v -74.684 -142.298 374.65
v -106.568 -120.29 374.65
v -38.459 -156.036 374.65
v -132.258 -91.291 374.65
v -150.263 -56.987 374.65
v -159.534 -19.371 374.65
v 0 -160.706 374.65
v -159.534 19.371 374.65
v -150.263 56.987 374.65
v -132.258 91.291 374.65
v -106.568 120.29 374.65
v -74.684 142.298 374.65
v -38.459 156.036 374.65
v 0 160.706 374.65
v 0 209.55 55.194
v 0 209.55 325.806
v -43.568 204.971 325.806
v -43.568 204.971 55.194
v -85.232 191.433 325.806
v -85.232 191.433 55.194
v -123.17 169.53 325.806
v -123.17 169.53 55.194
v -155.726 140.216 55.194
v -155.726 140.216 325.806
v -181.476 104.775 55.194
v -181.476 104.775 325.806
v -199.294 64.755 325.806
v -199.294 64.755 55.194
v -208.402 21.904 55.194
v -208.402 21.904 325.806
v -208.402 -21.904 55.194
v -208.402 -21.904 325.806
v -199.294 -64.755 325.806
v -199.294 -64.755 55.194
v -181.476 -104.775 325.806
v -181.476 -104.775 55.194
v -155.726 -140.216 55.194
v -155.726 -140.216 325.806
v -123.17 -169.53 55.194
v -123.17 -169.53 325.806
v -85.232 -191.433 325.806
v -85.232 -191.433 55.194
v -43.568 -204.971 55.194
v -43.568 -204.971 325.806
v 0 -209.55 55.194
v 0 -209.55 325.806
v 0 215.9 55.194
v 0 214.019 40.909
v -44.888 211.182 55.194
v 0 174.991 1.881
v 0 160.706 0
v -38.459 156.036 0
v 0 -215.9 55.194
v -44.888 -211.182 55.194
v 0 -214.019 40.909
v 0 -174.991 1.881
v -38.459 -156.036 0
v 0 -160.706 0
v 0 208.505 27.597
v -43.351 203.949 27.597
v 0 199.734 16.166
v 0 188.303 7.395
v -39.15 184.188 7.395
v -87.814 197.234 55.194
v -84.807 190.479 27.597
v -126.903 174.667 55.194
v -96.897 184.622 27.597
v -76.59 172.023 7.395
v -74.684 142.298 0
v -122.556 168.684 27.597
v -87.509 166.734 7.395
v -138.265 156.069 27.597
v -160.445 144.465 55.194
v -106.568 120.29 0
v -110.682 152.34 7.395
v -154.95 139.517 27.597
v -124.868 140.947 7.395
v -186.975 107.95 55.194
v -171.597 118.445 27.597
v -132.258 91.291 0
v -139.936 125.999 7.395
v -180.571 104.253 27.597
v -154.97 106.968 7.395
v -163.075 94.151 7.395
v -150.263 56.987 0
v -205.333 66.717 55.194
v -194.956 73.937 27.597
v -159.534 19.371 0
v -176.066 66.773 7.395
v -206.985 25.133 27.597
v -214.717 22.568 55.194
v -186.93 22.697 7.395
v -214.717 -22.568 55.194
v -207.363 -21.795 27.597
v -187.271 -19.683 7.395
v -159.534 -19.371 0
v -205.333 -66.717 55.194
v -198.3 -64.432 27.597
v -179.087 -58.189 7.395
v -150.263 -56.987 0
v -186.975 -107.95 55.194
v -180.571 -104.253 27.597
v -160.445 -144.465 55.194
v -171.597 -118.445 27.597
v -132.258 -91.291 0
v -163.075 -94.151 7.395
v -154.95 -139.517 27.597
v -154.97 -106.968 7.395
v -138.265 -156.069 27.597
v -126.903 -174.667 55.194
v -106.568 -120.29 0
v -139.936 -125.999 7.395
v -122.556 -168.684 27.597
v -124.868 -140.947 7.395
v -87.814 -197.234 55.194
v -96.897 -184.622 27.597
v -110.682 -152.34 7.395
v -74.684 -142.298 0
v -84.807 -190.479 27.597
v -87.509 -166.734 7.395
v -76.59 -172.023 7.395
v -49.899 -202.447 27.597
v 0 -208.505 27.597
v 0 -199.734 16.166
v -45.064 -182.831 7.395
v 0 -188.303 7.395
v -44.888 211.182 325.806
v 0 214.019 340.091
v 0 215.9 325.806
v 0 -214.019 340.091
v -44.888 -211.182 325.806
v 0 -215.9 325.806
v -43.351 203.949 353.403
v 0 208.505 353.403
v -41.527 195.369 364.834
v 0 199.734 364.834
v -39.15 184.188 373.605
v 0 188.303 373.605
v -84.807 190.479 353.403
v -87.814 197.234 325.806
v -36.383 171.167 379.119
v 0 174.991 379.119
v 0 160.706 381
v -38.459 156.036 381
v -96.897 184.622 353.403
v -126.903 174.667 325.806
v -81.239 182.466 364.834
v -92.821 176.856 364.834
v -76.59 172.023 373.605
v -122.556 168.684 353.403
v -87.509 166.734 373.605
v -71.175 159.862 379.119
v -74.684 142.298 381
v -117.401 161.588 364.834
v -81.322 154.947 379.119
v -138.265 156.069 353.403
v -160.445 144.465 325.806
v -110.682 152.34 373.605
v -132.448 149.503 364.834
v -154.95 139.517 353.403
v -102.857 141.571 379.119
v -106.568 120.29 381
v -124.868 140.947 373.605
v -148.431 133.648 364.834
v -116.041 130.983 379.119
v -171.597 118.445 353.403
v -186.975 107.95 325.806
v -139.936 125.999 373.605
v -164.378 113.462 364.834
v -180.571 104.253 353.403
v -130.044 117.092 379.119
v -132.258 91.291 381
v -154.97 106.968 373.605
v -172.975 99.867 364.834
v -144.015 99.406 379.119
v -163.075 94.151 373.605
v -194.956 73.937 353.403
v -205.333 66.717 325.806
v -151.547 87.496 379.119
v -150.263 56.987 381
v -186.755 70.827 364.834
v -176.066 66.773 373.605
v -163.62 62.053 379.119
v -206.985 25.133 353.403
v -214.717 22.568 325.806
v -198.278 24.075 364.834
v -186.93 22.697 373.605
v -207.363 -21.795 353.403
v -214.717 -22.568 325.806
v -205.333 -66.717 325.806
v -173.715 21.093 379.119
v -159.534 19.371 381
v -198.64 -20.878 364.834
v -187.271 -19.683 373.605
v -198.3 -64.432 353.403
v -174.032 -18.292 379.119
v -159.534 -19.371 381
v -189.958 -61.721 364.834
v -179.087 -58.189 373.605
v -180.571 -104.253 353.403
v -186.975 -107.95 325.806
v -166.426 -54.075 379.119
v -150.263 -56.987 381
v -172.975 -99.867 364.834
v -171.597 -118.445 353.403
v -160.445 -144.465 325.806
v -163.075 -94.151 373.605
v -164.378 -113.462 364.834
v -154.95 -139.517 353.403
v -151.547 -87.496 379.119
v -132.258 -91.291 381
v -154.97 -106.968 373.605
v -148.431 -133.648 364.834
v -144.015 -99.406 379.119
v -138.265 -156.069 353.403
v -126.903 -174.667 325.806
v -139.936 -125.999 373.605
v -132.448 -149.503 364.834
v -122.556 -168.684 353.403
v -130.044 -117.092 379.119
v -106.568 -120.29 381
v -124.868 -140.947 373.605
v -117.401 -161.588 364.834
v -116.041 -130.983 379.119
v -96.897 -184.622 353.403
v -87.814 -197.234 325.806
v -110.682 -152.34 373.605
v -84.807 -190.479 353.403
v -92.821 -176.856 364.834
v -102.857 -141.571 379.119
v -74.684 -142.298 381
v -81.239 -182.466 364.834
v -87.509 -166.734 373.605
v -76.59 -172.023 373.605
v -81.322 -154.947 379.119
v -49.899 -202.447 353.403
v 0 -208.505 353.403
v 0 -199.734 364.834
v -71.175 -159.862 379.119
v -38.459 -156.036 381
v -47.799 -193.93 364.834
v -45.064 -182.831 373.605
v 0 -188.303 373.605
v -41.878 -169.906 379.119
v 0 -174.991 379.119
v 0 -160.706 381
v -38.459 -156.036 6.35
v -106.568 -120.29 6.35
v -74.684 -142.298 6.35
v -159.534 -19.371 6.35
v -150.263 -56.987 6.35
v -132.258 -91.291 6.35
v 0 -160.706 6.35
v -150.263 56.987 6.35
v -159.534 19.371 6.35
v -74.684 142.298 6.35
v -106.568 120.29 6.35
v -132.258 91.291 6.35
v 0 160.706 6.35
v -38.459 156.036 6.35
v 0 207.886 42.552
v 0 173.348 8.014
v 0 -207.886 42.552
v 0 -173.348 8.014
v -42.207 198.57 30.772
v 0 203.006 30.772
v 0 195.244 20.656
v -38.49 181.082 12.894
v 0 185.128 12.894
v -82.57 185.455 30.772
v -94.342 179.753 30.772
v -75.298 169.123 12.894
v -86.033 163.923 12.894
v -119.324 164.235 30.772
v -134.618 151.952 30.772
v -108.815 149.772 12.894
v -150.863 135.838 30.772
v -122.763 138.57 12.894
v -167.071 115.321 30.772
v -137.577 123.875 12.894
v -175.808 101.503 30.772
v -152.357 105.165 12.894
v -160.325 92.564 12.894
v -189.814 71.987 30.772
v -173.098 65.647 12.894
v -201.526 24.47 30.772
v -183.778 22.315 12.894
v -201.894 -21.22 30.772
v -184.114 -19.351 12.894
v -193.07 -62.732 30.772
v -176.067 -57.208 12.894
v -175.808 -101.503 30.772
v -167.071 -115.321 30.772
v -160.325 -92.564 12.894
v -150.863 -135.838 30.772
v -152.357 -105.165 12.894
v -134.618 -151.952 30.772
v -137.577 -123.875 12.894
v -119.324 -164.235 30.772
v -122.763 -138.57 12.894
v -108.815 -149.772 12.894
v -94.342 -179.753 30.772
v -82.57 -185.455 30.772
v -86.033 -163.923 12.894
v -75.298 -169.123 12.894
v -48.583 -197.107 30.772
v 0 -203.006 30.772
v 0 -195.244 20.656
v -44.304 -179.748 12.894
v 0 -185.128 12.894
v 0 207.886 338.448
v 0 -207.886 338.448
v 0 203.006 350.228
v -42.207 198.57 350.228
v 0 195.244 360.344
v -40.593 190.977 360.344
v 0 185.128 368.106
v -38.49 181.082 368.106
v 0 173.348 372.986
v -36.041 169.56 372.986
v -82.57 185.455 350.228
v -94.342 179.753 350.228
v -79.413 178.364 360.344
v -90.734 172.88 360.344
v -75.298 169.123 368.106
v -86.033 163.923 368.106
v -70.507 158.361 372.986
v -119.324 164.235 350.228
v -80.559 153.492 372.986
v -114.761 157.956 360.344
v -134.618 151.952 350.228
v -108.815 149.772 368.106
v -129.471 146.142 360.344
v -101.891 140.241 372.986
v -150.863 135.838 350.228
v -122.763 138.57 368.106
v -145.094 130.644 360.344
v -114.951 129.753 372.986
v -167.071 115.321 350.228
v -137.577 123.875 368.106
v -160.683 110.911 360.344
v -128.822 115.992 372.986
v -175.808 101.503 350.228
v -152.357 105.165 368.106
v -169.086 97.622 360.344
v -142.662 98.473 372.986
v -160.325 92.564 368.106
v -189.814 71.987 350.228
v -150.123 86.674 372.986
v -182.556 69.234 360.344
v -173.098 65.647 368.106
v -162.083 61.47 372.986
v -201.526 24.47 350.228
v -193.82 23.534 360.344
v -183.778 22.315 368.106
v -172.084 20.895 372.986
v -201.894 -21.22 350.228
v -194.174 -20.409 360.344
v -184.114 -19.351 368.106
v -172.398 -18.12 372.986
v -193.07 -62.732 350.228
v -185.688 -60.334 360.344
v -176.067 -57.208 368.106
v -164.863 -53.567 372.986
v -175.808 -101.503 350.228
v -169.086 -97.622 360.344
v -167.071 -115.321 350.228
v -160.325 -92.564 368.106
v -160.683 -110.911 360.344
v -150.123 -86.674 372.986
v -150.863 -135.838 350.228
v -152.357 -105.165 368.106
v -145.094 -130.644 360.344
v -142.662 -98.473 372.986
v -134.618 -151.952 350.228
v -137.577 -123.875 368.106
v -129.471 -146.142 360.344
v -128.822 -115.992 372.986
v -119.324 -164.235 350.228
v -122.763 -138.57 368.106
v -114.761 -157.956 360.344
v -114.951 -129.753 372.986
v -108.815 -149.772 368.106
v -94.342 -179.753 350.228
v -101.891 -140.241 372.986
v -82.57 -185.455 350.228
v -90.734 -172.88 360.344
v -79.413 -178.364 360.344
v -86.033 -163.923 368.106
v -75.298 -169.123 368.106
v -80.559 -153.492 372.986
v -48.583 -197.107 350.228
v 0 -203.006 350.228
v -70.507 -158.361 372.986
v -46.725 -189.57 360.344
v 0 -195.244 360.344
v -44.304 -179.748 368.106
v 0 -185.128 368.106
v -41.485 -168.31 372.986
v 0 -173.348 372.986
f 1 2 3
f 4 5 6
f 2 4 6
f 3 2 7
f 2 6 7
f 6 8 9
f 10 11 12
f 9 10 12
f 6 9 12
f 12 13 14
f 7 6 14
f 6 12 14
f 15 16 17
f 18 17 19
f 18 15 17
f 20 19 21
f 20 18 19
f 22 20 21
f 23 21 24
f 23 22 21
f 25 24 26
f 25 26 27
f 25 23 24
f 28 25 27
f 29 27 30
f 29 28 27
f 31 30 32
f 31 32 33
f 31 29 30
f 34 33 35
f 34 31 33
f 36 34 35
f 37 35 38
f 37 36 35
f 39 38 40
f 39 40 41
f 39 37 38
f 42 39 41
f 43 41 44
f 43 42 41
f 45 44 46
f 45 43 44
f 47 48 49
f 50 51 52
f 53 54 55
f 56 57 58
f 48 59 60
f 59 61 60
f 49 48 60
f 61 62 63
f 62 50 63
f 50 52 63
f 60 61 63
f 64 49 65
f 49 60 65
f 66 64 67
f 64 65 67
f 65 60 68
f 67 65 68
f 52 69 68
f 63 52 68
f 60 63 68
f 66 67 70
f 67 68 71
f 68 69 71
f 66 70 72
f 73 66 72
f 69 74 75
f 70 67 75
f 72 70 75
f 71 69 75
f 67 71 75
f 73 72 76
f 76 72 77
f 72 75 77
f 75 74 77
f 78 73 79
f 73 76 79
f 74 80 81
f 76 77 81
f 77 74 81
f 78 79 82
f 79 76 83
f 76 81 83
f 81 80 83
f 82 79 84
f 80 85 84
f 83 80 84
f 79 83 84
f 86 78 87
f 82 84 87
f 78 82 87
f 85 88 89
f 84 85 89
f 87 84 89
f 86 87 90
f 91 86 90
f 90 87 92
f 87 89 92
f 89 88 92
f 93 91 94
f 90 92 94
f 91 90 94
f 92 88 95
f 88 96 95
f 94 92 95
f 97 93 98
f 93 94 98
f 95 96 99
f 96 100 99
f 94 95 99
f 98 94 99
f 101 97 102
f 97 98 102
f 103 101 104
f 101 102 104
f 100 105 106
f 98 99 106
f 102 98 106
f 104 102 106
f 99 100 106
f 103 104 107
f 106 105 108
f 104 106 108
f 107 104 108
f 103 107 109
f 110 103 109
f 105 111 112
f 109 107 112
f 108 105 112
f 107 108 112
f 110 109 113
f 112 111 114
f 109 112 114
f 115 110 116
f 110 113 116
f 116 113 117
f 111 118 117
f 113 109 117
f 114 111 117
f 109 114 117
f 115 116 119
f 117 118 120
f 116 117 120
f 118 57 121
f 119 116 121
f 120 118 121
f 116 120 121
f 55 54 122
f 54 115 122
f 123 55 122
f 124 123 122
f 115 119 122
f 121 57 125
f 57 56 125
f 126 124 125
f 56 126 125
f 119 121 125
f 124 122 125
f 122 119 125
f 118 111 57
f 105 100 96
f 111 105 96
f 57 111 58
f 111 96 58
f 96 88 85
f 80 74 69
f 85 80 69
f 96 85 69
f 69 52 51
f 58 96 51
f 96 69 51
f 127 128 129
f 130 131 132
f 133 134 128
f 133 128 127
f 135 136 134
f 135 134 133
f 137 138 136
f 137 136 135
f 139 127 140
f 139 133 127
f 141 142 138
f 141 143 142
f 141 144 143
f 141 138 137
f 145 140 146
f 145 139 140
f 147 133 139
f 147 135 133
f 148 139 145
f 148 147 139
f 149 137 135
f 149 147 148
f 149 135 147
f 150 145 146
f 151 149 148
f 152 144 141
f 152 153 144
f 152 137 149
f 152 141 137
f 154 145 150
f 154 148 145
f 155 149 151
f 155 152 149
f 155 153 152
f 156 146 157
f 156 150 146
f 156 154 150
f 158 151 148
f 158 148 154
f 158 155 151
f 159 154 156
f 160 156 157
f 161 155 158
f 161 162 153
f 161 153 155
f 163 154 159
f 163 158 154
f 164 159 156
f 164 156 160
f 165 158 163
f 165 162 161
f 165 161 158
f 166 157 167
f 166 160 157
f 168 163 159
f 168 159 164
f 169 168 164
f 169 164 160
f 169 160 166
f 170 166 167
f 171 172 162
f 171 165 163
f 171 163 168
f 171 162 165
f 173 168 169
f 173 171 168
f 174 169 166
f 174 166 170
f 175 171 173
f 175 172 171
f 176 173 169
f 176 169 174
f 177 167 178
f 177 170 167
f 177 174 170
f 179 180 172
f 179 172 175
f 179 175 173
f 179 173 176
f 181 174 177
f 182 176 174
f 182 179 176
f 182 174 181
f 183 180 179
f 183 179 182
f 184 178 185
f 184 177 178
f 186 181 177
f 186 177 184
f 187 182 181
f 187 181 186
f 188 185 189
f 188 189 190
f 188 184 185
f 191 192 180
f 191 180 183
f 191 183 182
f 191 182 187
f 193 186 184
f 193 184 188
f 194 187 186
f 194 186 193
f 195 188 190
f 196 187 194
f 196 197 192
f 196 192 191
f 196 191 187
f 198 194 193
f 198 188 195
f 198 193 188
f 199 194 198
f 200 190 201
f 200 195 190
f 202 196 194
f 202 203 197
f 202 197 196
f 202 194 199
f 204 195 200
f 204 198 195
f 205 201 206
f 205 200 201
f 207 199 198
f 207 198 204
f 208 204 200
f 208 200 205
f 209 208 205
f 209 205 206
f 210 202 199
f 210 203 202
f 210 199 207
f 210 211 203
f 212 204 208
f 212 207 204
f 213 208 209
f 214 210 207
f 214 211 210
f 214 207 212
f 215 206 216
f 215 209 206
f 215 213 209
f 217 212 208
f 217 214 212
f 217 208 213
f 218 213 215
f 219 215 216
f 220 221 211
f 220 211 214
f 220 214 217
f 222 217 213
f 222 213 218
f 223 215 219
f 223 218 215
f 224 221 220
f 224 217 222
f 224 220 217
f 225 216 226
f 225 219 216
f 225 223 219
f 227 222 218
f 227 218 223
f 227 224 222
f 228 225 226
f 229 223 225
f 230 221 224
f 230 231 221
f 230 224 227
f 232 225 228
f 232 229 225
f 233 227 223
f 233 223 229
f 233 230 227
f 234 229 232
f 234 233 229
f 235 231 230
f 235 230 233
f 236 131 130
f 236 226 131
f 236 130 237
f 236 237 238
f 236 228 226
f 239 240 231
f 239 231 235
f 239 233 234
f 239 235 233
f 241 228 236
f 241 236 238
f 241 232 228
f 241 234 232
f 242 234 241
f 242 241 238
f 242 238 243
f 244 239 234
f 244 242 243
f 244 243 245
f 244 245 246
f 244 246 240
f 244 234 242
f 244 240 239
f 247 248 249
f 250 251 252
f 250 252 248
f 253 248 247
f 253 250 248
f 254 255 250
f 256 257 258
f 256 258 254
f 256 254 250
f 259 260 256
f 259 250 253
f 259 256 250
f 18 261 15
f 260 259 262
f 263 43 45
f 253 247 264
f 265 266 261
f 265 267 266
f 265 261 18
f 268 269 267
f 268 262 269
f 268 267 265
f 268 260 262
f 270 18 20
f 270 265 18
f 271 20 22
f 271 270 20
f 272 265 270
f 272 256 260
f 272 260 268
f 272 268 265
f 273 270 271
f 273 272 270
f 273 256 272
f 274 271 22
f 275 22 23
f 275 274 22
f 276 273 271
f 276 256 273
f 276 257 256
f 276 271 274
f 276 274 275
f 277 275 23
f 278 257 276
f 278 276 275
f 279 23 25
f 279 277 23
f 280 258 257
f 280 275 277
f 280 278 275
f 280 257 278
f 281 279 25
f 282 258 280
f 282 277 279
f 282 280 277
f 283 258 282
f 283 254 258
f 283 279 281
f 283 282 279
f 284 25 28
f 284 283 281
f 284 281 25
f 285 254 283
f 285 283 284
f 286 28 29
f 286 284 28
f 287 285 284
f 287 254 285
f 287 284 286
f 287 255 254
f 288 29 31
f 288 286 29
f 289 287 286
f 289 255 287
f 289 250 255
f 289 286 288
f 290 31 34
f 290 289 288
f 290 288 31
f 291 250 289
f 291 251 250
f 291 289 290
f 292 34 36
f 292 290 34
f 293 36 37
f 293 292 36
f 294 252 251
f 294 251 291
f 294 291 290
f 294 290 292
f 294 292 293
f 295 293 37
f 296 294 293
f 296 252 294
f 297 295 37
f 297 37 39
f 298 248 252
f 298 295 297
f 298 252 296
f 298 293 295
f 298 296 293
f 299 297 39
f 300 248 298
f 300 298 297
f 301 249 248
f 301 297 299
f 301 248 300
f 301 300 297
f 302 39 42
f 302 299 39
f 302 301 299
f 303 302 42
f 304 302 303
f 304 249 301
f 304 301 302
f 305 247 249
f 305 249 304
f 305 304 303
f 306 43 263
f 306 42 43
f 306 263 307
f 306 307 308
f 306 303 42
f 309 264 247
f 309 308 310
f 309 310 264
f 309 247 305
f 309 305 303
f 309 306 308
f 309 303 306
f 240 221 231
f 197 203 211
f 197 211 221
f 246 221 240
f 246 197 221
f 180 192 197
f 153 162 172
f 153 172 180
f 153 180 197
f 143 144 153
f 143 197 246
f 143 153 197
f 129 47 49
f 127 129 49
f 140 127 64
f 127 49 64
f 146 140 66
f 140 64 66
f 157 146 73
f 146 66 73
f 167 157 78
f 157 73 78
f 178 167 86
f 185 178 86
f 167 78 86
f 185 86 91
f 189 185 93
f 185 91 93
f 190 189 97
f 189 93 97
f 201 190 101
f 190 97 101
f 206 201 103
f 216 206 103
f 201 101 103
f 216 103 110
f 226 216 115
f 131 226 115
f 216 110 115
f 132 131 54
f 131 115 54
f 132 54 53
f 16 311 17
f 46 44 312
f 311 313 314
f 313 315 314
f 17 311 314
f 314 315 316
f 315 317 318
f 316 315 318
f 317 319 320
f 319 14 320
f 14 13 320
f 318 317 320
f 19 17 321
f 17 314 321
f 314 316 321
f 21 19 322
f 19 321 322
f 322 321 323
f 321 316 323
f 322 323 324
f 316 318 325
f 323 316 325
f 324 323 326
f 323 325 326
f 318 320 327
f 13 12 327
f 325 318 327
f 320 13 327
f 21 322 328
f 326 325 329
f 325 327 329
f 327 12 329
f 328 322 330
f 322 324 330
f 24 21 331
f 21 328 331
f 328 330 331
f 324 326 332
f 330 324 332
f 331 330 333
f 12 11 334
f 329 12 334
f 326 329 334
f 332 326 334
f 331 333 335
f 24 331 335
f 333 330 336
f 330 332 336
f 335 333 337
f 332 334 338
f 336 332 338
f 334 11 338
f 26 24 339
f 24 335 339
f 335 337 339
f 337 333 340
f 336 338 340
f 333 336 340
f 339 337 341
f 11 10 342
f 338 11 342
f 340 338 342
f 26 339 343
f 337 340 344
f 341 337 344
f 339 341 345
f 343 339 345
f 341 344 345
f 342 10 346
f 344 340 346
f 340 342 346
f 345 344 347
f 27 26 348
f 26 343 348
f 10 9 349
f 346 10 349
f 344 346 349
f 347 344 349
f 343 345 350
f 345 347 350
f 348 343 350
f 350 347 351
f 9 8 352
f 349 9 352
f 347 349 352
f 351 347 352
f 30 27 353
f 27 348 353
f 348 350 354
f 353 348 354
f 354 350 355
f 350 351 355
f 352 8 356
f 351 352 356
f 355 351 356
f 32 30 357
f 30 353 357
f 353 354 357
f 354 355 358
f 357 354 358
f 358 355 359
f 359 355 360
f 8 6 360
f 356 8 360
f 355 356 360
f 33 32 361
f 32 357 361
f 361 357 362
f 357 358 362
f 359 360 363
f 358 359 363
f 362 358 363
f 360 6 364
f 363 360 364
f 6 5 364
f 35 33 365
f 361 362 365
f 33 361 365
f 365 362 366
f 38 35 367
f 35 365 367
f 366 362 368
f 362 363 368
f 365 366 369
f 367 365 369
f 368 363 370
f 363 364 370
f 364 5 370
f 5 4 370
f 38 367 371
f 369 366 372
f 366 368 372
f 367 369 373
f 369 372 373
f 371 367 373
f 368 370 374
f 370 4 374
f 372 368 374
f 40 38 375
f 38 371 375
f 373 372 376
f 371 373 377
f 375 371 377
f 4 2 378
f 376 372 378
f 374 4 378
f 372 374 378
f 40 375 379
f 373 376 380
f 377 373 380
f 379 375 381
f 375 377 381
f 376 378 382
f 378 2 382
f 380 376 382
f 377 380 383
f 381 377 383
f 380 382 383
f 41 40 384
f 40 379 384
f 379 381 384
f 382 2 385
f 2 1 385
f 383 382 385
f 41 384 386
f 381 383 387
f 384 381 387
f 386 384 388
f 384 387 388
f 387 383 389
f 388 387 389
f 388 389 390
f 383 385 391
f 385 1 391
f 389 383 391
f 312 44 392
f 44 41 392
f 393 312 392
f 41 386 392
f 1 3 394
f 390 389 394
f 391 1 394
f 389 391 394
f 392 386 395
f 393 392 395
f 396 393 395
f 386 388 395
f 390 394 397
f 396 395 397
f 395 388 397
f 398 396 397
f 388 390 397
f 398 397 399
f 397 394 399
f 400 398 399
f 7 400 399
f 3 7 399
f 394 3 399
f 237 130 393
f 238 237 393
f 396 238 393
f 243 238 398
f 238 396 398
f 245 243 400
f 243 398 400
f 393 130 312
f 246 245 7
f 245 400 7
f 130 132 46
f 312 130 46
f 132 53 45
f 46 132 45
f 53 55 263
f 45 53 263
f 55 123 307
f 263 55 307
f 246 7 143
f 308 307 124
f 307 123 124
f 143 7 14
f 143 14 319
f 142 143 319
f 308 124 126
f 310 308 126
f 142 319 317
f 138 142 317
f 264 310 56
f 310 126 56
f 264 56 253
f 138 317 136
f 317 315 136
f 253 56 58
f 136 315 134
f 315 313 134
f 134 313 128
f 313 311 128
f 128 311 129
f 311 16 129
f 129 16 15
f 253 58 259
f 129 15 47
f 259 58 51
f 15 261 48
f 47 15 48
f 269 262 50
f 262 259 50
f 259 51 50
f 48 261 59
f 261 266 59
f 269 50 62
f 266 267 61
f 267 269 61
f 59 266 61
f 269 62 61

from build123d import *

# Parameters (mm, degrees)
F1_DEPTH = 381
F2_R     = 55.1942
F3_R     = 55.1942
F4_T     = -6.35


with BuildPart() as f1:
    # F0 (on Top) → F1 (new body)
    with BuildSketch(Plane.XY):
        with BuildLine():
            Line((0, -215.9), (0, 215.9))
            ThreePointArc((0, 215.9), (-215.9, 0), (0, -215.9))
        make_face()
    extrude(amount=F1_DEPTH)

    # F2
    f2_edges = [f1.edges().sort_by_distance(p)[0] for p in [
        (-215.9, 0, 381),
    ]]
    fillet(f2_edges, radius=F2_R)

    # F3
    f3_edges = [f1.edges().sort_by_distance(p)[0] for p in [
        (-215.9, 0, 0),
    ]]
    fillet(f3_edges, radius=F3_R)

    # F4
    f4_openings = [f1.faces().sort_by_distance(p)[0] for p in [
        (0, 0, 190.5),
    ]]
    offset(amount=F4_T, openings=f4_openings)


solid = f1.part
